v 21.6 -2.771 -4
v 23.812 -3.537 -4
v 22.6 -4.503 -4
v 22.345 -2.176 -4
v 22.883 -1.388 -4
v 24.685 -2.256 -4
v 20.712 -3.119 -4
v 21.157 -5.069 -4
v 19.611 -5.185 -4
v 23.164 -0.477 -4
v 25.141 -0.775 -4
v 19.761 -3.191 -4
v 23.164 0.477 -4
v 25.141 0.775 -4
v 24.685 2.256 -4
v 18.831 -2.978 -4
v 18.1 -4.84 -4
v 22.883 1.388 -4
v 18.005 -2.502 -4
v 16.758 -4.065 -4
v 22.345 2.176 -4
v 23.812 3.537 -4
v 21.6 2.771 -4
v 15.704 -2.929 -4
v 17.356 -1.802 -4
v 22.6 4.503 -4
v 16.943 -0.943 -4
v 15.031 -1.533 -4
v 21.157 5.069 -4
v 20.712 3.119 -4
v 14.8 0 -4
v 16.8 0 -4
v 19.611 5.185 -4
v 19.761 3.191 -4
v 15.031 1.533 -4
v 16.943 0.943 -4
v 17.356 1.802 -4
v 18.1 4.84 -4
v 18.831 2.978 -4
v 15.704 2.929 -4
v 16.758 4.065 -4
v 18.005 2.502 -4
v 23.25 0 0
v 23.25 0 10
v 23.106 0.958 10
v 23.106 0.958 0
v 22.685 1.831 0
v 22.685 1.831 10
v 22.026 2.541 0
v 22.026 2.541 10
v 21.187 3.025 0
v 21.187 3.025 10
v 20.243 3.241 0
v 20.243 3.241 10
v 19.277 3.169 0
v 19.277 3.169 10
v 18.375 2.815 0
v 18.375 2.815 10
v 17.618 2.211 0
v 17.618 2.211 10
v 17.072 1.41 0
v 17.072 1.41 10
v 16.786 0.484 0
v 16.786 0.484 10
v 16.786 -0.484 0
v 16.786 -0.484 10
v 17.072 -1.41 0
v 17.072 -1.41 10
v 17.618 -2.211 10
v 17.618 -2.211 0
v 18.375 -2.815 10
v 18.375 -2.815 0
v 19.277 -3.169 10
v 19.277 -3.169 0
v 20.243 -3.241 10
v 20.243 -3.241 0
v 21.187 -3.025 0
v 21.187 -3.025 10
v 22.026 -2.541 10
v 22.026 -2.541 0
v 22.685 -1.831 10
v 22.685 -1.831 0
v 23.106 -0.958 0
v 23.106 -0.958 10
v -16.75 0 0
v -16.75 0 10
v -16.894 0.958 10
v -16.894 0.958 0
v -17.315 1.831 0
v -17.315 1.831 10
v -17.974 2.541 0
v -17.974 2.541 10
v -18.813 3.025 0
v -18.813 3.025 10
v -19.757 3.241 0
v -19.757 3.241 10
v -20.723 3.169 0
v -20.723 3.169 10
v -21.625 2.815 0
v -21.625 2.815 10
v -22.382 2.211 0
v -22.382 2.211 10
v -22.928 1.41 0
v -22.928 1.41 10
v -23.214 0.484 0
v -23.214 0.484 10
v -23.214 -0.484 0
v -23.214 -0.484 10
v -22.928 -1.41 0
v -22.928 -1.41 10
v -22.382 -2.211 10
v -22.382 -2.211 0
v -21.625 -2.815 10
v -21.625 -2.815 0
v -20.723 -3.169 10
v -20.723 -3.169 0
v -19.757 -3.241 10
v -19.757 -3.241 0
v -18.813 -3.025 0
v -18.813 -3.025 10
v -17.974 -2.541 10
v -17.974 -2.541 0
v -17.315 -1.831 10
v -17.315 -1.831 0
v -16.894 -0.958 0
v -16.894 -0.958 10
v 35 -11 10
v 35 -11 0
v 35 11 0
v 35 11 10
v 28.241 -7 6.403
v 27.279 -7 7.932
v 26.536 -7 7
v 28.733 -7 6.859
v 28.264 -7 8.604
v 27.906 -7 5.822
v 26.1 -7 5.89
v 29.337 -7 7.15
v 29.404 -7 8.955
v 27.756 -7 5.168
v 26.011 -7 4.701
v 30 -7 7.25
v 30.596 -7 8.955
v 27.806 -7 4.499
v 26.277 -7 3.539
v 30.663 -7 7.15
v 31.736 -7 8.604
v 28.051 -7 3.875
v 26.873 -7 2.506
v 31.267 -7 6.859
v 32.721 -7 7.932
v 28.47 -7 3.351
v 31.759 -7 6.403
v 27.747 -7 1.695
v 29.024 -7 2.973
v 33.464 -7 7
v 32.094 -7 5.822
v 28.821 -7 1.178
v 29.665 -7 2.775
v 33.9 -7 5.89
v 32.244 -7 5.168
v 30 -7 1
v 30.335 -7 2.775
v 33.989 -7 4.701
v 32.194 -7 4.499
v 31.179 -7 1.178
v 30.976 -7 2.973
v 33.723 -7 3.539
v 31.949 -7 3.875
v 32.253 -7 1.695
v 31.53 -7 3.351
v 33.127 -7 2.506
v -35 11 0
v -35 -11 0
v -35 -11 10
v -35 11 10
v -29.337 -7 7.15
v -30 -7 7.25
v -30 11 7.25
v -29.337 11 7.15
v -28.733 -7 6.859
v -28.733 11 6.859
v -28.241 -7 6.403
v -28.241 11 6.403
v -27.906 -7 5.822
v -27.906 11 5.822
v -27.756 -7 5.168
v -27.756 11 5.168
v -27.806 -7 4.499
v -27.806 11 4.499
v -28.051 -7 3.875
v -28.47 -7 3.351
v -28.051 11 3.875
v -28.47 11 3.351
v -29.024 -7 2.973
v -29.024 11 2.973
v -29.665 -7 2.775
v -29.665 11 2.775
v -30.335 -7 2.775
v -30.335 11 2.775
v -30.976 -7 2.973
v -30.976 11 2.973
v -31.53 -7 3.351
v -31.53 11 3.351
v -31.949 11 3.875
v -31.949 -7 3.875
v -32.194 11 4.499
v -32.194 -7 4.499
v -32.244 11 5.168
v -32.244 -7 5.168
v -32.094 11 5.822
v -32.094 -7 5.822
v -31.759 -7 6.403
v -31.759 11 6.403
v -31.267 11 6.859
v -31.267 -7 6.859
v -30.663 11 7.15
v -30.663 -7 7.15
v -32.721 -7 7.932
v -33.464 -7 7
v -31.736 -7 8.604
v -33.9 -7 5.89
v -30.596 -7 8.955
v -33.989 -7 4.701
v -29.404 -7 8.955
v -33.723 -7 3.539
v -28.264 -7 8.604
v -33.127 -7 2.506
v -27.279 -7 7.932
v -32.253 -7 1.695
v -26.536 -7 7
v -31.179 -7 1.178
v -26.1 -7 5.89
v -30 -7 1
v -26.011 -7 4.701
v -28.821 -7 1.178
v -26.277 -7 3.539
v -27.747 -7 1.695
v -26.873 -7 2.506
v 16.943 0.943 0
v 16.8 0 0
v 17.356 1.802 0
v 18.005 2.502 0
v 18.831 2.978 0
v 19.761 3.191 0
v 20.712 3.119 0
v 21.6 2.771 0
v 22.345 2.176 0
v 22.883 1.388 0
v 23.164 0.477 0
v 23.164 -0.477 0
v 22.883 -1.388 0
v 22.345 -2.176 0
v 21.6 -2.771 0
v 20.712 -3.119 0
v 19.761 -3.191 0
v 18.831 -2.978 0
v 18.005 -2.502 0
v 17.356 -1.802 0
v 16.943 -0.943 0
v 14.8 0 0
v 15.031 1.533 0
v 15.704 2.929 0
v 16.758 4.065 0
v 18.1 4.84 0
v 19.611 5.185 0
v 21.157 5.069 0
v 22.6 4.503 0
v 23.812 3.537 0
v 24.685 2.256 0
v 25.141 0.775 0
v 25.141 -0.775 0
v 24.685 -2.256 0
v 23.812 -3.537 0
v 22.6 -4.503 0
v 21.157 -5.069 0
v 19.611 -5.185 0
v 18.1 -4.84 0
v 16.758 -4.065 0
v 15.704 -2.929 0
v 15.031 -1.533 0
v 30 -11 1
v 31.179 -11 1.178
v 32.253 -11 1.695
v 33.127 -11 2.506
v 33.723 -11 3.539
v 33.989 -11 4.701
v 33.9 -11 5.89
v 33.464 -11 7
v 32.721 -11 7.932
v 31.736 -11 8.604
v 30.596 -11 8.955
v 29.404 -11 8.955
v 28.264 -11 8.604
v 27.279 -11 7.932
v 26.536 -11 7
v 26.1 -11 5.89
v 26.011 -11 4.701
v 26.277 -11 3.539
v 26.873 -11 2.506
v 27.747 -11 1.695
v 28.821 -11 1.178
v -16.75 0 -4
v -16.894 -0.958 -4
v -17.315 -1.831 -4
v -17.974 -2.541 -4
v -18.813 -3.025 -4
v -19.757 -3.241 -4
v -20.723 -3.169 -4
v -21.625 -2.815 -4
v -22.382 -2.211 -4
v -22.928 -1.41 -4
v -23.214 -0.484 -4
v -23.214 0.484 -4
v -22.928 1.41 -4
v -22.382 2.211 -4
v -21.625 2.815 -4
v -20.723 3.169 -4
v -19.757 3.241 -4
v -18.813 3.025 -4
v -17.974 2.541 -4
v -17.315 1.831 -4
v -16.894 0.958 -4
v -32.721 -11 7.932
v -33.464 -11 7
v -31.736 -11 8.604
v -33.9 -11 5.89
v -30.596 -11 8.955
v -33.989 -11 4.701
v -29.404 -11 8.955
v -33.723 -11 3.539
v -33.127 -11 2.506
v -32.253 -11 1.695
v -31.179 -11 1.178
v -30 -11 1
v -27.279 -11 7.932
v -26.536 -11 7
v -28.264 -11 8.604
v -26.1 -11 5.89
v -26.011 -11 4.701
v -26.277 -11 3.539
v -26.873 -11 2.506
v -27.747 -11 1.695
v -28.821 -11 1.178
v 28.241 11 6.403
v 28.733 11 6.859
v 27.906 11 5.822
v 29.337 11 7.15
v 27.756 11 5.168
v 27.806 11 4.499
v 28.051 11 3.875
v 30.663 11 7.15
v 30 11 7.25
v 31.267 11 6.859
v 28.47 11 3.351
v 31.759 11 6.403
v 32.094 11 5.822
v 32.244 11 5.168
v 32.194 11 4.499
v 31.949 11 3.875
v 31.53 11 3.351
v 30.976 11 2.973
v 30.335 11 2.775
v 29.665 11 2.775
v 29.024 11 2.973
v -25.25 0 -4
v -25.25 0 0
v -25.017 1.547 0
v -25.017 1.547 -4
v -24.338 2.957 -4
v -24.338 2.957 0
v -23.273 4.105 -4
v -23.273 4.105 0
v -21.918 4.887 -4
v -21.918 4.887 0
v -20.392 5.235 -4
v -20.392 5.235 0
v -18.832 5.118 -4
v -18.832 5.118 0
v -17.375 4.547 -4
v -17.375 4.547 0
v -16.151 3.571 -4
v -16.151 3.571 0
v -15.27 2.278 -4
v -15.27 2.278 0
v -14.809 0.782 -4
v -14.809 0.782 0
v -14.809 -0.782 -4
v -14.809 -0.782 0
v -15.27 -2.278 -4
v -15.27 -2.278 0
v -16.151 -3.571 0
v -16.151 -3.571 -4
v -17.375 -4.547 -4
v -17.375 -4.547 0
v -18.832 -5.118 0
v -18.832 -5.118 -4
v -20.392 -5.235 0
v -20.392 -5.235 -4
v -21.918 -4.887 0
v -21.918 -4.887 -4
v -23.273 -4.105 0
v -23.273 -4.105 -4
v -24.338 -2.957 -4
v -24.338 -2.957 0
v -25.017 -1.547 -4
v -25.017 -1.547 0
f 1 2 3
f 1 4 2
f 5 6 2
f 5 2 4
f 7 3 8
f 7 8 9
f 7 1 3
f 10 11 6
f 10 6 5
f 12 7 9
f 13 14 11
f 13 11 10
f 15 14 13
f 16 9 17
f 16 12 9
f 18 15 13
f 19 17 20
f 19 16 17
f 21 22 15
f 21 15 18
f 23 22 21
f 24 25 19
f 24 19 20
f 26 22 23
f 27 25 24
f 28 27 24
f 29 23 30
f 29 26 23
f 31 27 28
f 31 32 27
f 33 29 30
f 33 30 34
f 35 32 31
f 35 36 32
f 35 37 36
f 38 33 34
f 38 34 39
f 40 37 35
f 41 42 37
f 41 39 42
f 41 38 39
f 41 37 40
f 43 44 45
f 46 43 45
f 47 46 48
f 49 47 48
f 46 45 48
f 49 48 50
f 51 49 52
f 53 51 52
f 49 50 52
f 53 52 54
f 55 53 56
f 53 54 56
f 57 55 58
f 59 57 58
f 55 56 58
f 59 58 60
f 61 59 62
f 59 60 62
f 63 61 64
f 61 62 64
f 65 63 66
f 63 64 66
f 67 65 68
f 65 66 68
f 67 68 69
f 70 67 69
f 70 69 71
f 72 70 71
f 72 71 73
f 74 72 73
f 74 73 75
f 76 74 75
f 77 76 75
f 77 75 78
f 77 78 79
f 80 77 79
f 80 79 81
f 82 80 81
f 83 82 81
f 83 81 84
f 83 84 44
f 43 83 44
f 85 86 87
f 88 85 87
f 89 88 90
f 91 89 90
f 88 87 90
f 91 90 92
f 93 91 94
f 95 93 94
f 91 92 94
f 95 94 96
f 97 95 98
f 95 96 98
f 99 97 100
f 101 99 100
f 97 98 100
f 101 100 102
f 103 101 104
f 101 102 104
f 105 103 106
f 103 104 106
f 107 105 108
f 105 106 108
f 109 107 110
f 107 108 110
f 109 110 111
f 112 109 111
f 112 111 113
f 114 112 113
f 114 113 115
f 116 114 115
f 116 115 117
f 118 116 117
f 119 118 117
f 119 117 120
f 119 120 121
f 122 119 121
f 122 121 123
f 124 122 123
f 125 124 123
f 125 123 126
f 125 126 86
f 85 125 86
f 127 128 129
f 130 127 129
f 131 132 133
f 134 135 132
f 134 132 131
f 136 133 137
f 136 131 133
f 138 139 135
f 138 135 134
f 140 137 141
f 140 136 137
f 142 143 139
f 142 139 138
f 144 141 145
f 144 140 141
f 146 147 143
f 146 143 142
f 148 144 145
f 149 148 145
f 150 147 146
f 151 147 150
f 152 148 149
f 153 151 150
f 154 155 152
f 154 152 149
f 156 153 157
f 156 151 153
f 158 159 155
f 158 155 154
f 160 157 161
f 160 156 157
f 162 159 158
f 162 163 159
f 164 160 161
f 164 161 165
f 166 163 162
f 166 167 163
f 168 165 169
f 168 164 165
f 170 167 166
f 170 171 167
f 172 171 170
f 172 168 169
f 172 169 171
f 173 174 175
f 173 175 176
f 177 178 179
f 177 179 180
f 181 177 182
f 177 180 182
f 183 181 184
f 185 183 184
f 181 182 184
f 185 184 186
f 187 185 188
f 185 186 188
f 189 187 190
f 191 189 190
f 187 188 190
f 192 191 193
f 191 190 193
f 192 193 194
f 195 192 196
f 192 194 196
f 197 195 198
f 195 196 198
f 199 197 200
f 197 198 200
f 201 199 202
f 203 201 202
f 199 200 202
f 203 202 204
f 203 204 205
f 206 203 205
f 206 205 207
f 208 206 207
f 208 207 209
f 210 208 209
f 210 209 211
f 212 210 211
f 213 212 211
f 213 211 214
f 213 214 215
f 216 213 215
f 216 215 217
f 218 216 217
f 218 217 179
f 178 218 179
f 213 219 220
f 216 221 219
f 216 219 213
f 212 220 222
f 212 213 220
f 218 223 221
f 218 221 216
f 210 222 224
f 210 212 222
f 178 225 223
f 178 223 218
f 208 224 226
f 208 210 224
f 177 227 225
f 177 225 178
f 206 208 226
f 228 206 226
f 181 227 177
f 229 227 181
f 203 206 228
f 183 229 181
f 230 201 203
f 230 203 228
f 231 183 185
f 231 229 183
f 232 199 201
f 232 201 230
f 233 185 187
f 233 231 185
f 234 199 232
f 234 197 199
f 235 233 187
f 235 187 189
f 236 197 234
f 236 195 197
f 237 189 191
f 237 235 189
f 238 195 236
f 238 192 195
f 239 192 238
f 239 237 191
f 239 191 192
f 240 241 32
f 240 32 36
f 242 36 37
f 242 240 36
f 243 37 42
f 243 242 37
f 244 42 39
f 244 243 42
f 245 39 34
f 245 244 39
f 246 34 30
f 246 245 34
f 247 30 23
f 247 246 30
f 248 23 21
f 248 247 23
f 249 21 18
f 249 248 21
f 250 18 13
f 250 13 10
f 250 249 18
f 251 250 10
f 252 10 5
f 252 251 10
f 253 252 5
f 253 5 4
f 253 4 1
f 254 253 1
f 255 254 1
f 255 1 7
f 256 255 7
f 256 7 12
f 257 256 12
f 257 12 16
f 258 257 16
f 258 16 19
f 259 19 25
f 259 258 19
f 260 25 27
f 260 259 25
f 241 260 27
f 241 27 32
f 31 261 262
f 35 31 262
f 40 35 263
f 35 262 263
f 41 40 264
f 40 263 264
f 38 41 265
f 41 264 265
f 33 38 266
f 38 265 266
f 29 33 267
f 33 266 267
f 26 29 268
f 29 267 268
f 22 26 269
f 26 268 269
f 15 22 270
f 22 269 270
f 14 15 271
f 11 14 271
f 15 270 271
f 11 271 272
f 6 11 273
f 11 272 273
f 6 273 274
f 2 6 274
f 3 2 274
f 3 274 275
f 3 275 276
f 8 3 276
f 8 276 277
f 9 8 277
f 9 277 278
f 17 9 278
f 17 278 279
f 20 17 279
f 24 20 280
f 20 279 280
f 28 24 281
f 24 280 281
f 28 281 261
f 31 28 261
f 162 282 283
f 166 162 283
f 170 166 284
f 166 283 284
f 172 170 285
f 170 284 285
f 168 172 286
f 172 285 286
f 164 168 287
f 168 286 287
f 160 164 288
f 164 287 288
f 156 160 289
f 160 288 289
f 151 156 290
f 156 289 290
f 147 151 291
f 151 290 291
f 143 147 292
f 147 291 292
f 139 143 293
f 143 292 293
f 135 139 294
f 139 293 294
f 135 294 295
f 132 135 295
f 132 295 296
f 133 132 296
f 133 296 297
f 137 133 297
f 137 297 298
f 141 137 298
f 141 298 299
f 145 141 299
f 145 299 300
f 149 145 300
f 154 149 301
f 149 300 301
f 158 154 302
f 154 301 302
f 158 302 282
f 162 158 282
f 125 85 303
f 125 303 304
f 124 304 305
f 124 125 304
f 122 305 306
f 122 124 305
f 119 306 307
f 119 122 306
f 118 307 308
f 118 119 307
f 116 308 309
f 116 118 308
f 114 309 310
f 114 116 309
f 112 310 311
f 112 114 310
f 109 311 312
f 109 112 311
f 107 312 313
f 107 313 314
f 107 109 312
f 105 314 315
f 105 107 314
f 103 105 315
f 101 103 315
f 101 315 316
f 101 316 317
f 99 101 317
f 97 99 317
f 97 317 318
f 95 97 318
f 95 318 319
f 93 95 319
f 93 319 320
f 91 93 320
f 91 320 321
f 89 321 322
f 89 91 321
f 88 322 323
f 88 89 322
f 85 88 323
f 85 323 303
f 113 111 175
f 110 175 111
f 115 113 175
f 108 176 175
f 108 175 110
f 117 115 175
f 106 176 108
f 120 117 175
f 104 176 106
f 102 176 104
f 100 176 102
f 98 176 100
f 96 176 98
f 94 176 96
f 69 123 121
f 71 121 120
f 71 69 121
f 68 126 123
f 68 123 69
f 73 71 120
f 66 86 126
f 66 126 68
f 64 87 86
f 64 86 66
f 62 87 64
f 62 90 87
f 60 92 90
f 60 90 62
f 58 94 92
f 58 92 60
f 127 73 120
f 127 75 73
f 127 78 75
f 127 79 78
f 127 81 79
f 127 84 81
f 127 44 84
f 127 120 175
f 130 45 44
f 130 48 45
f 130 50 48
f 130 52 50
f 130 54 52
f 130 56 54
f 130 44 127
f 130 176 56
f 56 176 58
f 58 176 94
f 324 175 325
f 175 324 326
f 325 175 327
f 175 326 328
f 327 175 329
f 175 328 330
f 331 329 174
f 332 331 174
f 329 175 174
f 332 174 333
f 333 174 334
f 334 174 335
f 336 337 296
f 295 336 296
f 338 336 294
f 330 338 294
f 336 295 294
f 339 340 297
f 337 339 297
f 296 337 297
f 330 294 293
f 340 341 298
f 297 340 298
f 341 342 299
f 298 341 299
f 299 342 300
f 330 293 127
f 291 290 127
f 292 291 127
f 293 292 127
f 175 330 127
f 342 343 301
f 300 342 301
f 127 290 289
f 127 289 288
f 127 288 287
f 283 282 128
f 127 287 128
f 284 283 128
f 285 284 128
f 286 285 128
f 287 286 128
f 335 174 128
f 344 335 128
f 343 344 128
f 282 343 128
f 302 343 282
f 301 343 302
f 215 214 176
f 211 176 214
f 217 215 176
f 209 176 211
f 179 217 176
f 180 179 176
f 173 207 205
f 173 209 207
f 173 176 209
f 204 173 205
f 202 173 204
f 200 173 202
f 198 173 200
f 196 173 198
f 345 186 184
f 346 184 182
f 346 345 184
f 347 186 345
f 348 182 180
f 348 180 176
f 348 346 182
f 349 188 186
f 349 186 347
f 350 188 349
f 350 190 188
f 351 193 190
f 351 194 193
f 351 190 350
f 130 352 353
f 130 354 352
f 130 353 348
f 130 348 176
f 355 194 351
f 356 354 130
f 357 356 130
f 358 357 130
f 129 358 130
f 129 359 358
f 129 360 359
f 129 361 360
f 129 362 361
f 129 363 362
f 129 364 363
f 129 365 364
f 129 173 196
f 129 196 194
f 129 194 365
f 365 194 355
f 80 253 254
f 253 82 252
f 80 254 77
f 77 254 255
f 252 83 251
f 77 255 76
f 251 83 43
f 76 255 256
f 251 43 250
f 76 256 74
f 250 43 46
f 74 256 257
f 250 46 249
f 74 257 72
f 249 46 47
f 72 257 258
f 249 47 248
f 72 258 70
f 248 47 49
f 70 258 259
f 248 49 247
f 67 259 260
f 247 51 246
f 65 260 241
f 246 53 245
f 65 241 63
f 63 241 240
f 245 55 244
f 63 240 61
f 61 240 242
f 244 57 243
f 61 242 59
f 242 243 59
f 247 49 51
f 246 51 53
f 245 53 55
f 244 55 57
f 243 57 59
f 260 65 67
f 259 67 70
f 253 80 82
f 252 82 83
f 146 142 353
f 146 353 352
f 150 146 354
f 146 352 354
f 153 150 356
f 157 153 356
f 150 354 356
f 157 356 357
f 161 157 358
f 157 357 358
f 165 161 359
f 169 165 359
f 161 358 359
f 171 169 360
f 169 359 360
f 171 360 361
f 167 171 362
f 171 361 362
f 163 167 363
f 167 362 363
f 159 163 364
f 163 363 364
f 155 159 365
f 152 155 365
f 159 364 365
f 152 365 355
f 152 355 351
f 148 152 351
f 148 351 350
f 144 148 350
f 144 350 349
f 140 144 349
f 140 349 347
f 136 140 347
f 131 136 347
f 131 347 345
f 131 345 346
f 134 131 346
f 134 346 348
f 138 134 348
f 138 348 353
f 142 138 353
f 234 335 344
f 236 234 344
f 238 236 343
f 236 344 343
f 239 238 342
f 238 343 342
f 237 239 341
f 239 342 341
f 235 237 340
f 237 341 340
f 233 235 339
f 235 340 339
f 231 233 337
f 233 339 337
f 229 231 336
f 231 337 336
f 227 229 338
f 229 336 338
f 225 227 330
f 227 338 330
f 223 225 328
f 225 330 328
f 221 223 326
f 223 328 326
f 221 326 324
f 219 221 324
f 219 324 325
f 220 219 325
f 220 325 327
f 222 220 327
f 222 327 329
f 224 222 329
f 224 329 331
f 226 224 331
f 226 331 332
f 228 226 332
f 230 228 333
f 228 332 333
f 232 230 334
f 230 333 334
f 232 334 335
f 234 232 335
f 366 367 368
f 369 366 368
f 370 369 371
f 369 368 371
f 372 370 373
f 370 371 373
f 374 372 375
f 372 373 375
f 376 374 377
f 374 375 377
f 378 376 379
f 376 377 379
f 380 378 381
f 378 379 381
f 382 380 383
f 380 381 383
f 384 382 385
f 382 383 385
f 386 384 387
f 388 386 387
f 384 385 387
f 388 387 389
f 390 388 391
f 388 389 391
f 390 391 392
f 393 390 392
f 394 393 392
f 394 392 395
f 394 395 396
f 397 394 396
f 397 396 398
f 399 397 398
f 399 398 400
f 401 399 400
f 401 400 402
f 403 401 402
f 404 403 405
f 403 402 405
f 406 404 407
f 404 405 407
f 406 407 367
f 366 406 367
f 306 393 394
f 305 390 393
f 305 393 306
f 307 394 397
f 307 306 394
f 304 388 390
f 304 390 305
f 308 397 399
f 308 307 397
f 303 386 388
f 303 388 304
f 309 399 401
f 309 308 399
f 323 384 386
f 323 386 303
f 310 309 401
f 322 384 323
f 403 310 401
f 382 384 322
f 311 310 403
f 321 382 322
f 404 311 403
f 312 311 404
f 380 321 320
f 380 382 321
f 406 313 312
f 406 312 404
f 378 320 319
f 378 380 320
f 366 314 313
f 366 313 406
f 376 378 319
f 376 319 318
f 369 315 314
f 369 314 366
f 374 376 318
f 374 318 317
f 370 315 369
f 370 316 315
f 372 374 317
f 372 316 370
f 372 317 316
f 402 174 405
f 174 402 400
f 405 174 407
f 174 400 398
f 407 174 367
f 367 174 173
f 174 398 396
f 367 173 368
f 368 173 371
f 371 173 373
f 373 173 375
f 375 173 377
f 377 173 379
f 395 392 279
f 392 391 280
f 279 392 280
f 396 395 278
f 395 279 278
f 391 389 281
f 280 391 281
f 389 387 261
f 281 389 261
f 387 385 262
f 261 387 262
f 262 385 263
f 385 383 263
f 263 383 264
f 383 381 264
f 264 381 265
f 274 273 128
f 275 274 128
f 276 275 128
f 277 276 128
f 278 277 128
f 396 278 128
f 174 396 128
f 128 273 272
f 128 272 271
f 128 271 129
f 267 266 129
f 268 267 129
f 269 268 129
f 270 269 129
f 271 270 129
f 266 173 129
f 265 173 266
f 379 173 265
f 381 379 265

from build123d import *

# Parameters (mm, degrees)
SKETCH1_W           = 70
SKETCH1_H           = 22
BOSS_EXTRUDE1_DEPTH = 10
SKETCH2_R           = 2.25
CUT_EXTRUDE1_DEPTH  = 45
SKETCH3_R           = 3.25
CUT_EXTRUDE2_DEPTH  = 45
SKETCH4_R           = 5.199573864
SKETCH4_R_2         = 3.199573864
SKETCH4_R_3         = 5.25
SKETCH4_R_4         = 3.25
BOSS_EXTRUDE2_DEPTH = 4
SKETCH5_R           = 4
CUT_EXTRUDE3_DEPTH  = 4


with BuildPart() as part:
    # Sketch1 → Boss-Extrude1 (new body)
    with BuildSketch(Plane.XY):
        Rectangle(SKETCH1_W, SKETCH1_H)
    extrude(amount=BOSS_EXTRUDE1_DEPTH)

    # Sketch2 → Cut-Extrude1 (cut)
    with BuildSketch(Plane(origin=(0, 11, 0), x_dir=(1, 0, 0), z_dir=(0, 1, 0))):
        with Locations(Location((-30, -5, 0), (0, 0, 270))):
            Circle(SKETCH2_R)
        with Locations(Location((30, -5, 0), (0, 0, 270))):
            Circle(SKETCH2_R)
    extrude(amount=-CUT_EXTRUDE1_DEPTH, mode=Mode.SUBTRACT)

    # Sketch3 → Cut-Extrude2 (cut)
    with BuildSketch(Plane.XY.offset(10)):
        with Locations((20, 0)):
            Circle(SKETCH3_R)
        with Locations((-20, 0)):
            Circle(SKETCH3_R)
    extrude(amount=-CUT_EXTRUDE2_DEPTH, mode=Mode.SUBTRACT)

    # Sketch4 → Boss-Extrude2 (add)
    # profile 1 of 2: a face of its own
    with BuildSketch(Plane(origin=(0, 0, 0), x_dir=(-1, 0, 0), z_dir=(0, 0, -1))):
        with Locations((-20, 0)):
            Circle(SKETCH4_R)
        with Locations((-20, 0)):
            Circle(SKETCH4_R_2, mode=Mode.SUBTRACT)
    # profile 2 of 2: a face of its own
    with BuildSketch(Plane(origin=(0, 0, 0), x_dir=(-1, 0, 0), z_dir=(0, 0, -1))):
        with Locations((20, 0)):
            Circle(SKETCH4_R_3)
        with Locations(Location((20, 0, 0), (0, 0, 180))):
            Circle(SKETCH4_R_4, mode=Mode.SUBTRACT)
    extrude(amount=BOSS_EXTRUDE2_DEPTH)

    # Sketch5 → Cut-Extrude3 (cut)
    with BuildSketch(Plane.XZ.offset(11)):
        with Locations(Location((30, 5, 0), (0, 0, 270))):
            Circle(SKETCH5_R)
        with Locations(Location((-30, 5, 0), (0, 0, 270))):
            Circle(SKETCH5_R)
    extrude(amount=-CUT_EXTRUDE3_DEPTH, mode=Mode.SUBTRACT)


solid = part.part
